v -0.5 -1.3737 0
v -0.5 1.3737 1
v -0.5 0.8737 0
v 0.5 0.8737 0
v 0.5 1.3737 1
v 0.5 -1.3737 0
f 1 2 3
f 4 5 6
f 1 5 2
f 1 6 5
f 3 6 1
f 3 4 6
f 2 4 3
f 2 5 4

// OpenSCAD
module rachetTooth(ht = 1, thk=1,ra = 20, ba = 60){
//	ra = ramp angle
//	ba = back angle
//	ht = height
	
	xh = ht/tan(ra);
	xb = xh - ht*sin(90-ba);
	//echo(xh);
	rotate([0,0,90])
	translate([0,thk/2,0])
	rotate([90,0,0])
	translate([-xh/2,0,0])
	linear_extrude(height = 1) polygon(points=[[0,0],[xh,ht],[xb,0]]);
}
rachetTooth();
